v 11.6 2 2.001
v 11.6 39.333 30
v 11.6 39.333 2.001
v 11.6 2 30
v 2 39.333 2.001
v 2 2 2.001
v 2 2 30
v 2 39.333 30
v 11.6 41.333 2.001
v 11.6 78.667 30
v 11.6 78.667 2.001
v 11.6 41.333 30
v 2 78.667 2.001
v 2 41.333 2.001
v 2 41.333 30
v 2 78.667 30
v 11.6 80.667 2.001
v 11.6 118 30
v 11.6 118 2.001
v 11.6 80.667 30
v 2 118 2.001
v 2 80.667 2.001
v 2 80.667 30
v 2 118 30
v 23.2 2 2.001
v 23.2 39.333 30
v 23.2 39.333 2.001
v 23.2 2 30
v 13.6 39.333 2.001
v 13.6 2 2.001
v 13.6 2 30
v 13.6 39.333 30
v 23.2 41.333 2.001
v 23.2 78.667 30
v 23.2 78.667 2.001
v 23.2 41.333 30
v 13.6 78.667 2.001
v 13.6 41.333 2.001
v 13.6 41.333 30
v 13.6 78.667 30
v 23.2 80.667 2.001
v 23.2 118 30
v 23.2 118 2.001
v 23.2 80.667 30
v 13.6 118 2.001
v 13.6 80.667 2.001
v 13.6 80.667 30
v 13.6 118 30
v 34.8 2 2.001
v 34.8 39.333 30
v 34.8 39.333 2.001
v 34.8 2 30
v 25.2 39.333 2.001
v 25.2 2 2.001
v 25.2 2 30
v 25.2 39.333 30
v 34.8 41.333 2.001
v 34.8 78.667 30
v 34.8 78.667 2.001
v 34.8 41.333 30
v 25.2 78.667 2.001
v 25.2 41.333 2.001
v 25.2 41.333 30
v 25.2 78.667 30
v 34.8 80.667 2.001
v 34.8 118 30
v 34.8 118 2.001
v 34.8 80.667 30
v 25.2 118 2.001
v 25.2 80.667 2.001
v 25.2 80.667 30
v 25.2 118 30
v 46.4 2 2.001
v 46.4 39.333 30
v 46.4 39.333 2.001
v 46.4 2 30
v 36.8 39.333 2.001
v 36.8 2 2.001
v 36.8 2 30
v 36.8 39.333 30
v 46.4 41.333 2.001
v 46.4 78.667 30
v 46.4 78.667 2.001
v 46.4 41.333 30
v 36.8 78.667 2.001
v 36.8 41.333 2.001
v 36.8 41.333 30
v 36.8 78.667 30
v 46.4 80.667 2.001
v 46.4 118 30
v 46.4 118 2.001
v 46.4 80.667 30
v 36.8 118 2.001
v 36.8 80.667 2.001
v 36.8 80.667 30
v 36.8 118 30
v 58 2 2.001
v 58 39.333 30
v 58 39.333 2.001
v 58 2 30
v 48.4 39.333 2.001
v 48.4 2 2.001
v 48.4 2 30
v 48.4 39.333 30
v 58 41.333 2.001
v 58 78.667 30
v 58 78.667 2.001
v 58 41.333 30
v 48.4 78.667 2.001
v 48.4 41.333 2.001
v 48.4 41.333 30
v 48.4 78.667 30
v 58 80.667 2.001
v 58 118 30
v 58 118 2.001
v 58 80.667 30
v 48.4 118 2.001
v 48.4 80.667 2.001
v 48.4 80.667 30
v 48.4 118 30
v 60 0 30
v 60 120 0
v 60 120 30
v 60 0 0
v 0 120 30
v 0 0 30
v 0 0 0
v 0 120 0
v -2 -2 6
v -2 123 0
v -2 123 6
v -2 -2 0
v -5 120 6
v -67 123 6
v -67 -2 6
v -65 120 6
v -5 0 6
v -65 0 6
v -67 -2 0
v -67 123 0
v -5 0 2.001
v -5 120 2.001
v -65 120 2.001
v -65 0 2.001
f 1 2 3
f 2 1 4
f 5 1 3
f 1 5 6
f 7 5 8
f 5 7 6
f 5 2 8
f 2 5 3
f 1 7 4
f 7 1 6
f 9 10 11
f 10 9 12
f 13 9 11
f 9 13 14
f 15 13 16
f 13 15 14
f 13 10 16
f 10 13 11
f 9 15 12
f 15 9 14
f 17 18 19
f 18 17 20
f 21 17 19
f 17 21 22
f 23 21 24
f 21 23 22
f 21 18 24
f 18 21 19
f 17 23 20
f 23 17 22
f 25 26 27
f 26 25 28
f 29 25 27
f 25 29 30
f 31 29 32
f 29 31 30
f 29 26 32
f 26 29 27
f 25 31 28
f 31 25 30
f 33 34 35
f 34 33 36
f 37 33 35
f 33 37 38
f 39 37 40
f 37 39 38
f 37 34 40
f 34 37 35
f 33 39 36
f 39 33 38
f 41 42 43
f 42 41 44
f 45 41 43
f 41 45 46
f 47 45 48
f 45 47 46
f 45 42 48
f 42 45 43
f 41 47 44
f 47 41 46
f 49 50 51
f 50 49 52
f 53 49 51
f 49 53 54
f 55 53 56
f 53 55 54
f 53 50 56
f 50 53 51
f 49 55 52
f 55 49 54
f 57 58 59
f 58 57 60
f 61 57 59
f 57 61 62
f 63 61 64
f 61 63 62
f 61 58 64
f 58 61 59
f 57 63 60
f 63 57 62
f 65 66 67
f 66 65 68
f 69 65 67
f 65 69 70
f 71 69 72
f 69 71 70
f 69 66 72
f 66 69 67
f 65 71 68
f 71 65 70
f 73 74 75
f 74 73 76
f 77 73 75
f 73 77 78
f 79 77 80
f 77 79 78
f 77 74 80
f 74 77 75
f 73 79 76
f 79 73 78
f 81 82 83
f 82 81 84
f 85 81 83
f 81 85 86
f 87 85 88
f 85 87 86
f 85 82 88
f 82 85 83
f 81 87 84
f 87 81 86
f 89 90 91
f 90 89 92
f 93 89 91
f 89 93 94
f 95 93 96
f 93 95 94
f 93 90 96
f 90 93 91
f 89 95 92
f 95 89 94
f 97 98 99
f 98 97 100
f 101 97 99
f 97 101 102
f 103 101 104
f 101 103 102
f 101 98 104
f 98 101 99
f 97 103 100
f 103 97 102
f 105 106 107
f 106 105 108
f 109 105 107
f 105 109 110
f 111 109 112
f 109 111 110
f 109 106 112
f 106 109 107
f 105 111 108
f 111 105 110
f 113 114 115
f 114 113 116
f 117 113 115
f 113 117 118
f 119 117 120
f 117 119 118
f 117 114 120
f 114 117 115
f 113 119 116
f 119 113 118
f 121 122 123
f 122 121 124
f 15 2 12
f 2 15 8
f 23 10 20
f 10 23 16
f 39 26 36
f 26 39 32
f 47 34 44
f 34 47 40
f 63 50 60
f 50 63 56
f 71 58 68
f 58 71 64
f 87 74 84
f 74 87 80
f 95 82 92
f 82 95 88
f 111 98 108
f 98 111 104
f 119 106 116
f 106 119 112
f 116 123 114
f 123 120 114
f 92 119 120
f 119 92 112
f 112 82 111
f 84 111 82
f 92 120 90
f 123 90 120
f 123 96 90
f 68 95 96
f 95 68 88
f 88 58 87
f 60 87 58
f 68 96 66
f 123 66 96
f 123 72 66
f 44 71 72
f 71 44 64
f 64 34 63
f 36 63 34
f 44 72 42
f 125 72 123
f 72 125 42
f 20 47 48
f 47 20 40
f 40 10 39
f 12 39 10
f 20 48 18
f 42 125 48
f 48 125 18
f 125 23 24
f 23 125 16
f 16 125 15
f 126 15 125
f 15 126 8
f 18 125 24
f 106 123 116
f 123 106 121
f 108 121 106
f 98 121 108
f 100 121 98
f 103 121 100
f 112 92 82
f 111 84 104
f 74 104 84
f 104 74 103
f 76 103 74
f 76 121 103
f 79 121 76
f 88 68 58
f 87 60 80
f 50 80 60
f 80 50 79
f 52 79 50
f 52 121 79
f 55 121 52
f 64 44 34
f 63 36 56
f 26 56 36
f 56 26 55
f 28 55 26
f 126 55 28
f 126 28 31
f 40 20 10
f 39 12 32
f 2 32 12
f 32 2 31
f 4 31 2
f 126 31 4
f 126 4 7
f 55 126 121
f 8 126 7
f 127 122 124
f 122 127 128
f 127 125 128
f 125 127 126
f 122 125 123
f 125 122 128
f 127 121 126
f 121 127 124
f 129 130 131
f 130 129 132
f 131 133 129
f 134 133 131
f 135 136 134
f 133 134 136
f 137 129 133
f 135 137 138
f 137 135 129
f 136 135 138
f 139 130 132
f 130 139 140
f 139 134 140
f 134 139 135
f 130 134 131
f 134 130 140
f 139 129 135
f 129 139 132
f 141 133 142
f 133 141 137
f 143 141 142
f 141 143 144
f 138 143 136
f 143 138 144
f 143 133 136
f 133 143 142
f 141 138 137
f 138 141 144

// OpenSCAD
//Box Depth (X)
x=60;

//Box Thickness (Y)
y=120;

//Box Height (Z)
z=30;

//Box Wall Thickness
h=2;

//Number of Rows
r=5;

//Number of Columns
c=3;

$fn=50;

module Body()
{cube([x,y,z]);}

module Lid()
{difference(){
    cube([x+1+2*h,y+1+2*h,z/5]);
    translate([h,h,h+.001])cube([x,y,(z/5-h)]);
    }
}

module Hole (){
cube([((x-h-r*(h))/r),(y-h-c*(h))/(c),z-h]);}

module Pattern (){
    for (i=[1:r]){
        for (j=[1:c]){
            translate ([h*(i)+(i-1)*(x-h-r*(h))/r,h*(j)+(j-1)*(y-h-c*(h))/(c),h+.001])Hole();
        }
    }}
    
difference ()
{
    Body();
    Pattern();
}

translate ([-x-5-h,-h,0])Lid();   
    
